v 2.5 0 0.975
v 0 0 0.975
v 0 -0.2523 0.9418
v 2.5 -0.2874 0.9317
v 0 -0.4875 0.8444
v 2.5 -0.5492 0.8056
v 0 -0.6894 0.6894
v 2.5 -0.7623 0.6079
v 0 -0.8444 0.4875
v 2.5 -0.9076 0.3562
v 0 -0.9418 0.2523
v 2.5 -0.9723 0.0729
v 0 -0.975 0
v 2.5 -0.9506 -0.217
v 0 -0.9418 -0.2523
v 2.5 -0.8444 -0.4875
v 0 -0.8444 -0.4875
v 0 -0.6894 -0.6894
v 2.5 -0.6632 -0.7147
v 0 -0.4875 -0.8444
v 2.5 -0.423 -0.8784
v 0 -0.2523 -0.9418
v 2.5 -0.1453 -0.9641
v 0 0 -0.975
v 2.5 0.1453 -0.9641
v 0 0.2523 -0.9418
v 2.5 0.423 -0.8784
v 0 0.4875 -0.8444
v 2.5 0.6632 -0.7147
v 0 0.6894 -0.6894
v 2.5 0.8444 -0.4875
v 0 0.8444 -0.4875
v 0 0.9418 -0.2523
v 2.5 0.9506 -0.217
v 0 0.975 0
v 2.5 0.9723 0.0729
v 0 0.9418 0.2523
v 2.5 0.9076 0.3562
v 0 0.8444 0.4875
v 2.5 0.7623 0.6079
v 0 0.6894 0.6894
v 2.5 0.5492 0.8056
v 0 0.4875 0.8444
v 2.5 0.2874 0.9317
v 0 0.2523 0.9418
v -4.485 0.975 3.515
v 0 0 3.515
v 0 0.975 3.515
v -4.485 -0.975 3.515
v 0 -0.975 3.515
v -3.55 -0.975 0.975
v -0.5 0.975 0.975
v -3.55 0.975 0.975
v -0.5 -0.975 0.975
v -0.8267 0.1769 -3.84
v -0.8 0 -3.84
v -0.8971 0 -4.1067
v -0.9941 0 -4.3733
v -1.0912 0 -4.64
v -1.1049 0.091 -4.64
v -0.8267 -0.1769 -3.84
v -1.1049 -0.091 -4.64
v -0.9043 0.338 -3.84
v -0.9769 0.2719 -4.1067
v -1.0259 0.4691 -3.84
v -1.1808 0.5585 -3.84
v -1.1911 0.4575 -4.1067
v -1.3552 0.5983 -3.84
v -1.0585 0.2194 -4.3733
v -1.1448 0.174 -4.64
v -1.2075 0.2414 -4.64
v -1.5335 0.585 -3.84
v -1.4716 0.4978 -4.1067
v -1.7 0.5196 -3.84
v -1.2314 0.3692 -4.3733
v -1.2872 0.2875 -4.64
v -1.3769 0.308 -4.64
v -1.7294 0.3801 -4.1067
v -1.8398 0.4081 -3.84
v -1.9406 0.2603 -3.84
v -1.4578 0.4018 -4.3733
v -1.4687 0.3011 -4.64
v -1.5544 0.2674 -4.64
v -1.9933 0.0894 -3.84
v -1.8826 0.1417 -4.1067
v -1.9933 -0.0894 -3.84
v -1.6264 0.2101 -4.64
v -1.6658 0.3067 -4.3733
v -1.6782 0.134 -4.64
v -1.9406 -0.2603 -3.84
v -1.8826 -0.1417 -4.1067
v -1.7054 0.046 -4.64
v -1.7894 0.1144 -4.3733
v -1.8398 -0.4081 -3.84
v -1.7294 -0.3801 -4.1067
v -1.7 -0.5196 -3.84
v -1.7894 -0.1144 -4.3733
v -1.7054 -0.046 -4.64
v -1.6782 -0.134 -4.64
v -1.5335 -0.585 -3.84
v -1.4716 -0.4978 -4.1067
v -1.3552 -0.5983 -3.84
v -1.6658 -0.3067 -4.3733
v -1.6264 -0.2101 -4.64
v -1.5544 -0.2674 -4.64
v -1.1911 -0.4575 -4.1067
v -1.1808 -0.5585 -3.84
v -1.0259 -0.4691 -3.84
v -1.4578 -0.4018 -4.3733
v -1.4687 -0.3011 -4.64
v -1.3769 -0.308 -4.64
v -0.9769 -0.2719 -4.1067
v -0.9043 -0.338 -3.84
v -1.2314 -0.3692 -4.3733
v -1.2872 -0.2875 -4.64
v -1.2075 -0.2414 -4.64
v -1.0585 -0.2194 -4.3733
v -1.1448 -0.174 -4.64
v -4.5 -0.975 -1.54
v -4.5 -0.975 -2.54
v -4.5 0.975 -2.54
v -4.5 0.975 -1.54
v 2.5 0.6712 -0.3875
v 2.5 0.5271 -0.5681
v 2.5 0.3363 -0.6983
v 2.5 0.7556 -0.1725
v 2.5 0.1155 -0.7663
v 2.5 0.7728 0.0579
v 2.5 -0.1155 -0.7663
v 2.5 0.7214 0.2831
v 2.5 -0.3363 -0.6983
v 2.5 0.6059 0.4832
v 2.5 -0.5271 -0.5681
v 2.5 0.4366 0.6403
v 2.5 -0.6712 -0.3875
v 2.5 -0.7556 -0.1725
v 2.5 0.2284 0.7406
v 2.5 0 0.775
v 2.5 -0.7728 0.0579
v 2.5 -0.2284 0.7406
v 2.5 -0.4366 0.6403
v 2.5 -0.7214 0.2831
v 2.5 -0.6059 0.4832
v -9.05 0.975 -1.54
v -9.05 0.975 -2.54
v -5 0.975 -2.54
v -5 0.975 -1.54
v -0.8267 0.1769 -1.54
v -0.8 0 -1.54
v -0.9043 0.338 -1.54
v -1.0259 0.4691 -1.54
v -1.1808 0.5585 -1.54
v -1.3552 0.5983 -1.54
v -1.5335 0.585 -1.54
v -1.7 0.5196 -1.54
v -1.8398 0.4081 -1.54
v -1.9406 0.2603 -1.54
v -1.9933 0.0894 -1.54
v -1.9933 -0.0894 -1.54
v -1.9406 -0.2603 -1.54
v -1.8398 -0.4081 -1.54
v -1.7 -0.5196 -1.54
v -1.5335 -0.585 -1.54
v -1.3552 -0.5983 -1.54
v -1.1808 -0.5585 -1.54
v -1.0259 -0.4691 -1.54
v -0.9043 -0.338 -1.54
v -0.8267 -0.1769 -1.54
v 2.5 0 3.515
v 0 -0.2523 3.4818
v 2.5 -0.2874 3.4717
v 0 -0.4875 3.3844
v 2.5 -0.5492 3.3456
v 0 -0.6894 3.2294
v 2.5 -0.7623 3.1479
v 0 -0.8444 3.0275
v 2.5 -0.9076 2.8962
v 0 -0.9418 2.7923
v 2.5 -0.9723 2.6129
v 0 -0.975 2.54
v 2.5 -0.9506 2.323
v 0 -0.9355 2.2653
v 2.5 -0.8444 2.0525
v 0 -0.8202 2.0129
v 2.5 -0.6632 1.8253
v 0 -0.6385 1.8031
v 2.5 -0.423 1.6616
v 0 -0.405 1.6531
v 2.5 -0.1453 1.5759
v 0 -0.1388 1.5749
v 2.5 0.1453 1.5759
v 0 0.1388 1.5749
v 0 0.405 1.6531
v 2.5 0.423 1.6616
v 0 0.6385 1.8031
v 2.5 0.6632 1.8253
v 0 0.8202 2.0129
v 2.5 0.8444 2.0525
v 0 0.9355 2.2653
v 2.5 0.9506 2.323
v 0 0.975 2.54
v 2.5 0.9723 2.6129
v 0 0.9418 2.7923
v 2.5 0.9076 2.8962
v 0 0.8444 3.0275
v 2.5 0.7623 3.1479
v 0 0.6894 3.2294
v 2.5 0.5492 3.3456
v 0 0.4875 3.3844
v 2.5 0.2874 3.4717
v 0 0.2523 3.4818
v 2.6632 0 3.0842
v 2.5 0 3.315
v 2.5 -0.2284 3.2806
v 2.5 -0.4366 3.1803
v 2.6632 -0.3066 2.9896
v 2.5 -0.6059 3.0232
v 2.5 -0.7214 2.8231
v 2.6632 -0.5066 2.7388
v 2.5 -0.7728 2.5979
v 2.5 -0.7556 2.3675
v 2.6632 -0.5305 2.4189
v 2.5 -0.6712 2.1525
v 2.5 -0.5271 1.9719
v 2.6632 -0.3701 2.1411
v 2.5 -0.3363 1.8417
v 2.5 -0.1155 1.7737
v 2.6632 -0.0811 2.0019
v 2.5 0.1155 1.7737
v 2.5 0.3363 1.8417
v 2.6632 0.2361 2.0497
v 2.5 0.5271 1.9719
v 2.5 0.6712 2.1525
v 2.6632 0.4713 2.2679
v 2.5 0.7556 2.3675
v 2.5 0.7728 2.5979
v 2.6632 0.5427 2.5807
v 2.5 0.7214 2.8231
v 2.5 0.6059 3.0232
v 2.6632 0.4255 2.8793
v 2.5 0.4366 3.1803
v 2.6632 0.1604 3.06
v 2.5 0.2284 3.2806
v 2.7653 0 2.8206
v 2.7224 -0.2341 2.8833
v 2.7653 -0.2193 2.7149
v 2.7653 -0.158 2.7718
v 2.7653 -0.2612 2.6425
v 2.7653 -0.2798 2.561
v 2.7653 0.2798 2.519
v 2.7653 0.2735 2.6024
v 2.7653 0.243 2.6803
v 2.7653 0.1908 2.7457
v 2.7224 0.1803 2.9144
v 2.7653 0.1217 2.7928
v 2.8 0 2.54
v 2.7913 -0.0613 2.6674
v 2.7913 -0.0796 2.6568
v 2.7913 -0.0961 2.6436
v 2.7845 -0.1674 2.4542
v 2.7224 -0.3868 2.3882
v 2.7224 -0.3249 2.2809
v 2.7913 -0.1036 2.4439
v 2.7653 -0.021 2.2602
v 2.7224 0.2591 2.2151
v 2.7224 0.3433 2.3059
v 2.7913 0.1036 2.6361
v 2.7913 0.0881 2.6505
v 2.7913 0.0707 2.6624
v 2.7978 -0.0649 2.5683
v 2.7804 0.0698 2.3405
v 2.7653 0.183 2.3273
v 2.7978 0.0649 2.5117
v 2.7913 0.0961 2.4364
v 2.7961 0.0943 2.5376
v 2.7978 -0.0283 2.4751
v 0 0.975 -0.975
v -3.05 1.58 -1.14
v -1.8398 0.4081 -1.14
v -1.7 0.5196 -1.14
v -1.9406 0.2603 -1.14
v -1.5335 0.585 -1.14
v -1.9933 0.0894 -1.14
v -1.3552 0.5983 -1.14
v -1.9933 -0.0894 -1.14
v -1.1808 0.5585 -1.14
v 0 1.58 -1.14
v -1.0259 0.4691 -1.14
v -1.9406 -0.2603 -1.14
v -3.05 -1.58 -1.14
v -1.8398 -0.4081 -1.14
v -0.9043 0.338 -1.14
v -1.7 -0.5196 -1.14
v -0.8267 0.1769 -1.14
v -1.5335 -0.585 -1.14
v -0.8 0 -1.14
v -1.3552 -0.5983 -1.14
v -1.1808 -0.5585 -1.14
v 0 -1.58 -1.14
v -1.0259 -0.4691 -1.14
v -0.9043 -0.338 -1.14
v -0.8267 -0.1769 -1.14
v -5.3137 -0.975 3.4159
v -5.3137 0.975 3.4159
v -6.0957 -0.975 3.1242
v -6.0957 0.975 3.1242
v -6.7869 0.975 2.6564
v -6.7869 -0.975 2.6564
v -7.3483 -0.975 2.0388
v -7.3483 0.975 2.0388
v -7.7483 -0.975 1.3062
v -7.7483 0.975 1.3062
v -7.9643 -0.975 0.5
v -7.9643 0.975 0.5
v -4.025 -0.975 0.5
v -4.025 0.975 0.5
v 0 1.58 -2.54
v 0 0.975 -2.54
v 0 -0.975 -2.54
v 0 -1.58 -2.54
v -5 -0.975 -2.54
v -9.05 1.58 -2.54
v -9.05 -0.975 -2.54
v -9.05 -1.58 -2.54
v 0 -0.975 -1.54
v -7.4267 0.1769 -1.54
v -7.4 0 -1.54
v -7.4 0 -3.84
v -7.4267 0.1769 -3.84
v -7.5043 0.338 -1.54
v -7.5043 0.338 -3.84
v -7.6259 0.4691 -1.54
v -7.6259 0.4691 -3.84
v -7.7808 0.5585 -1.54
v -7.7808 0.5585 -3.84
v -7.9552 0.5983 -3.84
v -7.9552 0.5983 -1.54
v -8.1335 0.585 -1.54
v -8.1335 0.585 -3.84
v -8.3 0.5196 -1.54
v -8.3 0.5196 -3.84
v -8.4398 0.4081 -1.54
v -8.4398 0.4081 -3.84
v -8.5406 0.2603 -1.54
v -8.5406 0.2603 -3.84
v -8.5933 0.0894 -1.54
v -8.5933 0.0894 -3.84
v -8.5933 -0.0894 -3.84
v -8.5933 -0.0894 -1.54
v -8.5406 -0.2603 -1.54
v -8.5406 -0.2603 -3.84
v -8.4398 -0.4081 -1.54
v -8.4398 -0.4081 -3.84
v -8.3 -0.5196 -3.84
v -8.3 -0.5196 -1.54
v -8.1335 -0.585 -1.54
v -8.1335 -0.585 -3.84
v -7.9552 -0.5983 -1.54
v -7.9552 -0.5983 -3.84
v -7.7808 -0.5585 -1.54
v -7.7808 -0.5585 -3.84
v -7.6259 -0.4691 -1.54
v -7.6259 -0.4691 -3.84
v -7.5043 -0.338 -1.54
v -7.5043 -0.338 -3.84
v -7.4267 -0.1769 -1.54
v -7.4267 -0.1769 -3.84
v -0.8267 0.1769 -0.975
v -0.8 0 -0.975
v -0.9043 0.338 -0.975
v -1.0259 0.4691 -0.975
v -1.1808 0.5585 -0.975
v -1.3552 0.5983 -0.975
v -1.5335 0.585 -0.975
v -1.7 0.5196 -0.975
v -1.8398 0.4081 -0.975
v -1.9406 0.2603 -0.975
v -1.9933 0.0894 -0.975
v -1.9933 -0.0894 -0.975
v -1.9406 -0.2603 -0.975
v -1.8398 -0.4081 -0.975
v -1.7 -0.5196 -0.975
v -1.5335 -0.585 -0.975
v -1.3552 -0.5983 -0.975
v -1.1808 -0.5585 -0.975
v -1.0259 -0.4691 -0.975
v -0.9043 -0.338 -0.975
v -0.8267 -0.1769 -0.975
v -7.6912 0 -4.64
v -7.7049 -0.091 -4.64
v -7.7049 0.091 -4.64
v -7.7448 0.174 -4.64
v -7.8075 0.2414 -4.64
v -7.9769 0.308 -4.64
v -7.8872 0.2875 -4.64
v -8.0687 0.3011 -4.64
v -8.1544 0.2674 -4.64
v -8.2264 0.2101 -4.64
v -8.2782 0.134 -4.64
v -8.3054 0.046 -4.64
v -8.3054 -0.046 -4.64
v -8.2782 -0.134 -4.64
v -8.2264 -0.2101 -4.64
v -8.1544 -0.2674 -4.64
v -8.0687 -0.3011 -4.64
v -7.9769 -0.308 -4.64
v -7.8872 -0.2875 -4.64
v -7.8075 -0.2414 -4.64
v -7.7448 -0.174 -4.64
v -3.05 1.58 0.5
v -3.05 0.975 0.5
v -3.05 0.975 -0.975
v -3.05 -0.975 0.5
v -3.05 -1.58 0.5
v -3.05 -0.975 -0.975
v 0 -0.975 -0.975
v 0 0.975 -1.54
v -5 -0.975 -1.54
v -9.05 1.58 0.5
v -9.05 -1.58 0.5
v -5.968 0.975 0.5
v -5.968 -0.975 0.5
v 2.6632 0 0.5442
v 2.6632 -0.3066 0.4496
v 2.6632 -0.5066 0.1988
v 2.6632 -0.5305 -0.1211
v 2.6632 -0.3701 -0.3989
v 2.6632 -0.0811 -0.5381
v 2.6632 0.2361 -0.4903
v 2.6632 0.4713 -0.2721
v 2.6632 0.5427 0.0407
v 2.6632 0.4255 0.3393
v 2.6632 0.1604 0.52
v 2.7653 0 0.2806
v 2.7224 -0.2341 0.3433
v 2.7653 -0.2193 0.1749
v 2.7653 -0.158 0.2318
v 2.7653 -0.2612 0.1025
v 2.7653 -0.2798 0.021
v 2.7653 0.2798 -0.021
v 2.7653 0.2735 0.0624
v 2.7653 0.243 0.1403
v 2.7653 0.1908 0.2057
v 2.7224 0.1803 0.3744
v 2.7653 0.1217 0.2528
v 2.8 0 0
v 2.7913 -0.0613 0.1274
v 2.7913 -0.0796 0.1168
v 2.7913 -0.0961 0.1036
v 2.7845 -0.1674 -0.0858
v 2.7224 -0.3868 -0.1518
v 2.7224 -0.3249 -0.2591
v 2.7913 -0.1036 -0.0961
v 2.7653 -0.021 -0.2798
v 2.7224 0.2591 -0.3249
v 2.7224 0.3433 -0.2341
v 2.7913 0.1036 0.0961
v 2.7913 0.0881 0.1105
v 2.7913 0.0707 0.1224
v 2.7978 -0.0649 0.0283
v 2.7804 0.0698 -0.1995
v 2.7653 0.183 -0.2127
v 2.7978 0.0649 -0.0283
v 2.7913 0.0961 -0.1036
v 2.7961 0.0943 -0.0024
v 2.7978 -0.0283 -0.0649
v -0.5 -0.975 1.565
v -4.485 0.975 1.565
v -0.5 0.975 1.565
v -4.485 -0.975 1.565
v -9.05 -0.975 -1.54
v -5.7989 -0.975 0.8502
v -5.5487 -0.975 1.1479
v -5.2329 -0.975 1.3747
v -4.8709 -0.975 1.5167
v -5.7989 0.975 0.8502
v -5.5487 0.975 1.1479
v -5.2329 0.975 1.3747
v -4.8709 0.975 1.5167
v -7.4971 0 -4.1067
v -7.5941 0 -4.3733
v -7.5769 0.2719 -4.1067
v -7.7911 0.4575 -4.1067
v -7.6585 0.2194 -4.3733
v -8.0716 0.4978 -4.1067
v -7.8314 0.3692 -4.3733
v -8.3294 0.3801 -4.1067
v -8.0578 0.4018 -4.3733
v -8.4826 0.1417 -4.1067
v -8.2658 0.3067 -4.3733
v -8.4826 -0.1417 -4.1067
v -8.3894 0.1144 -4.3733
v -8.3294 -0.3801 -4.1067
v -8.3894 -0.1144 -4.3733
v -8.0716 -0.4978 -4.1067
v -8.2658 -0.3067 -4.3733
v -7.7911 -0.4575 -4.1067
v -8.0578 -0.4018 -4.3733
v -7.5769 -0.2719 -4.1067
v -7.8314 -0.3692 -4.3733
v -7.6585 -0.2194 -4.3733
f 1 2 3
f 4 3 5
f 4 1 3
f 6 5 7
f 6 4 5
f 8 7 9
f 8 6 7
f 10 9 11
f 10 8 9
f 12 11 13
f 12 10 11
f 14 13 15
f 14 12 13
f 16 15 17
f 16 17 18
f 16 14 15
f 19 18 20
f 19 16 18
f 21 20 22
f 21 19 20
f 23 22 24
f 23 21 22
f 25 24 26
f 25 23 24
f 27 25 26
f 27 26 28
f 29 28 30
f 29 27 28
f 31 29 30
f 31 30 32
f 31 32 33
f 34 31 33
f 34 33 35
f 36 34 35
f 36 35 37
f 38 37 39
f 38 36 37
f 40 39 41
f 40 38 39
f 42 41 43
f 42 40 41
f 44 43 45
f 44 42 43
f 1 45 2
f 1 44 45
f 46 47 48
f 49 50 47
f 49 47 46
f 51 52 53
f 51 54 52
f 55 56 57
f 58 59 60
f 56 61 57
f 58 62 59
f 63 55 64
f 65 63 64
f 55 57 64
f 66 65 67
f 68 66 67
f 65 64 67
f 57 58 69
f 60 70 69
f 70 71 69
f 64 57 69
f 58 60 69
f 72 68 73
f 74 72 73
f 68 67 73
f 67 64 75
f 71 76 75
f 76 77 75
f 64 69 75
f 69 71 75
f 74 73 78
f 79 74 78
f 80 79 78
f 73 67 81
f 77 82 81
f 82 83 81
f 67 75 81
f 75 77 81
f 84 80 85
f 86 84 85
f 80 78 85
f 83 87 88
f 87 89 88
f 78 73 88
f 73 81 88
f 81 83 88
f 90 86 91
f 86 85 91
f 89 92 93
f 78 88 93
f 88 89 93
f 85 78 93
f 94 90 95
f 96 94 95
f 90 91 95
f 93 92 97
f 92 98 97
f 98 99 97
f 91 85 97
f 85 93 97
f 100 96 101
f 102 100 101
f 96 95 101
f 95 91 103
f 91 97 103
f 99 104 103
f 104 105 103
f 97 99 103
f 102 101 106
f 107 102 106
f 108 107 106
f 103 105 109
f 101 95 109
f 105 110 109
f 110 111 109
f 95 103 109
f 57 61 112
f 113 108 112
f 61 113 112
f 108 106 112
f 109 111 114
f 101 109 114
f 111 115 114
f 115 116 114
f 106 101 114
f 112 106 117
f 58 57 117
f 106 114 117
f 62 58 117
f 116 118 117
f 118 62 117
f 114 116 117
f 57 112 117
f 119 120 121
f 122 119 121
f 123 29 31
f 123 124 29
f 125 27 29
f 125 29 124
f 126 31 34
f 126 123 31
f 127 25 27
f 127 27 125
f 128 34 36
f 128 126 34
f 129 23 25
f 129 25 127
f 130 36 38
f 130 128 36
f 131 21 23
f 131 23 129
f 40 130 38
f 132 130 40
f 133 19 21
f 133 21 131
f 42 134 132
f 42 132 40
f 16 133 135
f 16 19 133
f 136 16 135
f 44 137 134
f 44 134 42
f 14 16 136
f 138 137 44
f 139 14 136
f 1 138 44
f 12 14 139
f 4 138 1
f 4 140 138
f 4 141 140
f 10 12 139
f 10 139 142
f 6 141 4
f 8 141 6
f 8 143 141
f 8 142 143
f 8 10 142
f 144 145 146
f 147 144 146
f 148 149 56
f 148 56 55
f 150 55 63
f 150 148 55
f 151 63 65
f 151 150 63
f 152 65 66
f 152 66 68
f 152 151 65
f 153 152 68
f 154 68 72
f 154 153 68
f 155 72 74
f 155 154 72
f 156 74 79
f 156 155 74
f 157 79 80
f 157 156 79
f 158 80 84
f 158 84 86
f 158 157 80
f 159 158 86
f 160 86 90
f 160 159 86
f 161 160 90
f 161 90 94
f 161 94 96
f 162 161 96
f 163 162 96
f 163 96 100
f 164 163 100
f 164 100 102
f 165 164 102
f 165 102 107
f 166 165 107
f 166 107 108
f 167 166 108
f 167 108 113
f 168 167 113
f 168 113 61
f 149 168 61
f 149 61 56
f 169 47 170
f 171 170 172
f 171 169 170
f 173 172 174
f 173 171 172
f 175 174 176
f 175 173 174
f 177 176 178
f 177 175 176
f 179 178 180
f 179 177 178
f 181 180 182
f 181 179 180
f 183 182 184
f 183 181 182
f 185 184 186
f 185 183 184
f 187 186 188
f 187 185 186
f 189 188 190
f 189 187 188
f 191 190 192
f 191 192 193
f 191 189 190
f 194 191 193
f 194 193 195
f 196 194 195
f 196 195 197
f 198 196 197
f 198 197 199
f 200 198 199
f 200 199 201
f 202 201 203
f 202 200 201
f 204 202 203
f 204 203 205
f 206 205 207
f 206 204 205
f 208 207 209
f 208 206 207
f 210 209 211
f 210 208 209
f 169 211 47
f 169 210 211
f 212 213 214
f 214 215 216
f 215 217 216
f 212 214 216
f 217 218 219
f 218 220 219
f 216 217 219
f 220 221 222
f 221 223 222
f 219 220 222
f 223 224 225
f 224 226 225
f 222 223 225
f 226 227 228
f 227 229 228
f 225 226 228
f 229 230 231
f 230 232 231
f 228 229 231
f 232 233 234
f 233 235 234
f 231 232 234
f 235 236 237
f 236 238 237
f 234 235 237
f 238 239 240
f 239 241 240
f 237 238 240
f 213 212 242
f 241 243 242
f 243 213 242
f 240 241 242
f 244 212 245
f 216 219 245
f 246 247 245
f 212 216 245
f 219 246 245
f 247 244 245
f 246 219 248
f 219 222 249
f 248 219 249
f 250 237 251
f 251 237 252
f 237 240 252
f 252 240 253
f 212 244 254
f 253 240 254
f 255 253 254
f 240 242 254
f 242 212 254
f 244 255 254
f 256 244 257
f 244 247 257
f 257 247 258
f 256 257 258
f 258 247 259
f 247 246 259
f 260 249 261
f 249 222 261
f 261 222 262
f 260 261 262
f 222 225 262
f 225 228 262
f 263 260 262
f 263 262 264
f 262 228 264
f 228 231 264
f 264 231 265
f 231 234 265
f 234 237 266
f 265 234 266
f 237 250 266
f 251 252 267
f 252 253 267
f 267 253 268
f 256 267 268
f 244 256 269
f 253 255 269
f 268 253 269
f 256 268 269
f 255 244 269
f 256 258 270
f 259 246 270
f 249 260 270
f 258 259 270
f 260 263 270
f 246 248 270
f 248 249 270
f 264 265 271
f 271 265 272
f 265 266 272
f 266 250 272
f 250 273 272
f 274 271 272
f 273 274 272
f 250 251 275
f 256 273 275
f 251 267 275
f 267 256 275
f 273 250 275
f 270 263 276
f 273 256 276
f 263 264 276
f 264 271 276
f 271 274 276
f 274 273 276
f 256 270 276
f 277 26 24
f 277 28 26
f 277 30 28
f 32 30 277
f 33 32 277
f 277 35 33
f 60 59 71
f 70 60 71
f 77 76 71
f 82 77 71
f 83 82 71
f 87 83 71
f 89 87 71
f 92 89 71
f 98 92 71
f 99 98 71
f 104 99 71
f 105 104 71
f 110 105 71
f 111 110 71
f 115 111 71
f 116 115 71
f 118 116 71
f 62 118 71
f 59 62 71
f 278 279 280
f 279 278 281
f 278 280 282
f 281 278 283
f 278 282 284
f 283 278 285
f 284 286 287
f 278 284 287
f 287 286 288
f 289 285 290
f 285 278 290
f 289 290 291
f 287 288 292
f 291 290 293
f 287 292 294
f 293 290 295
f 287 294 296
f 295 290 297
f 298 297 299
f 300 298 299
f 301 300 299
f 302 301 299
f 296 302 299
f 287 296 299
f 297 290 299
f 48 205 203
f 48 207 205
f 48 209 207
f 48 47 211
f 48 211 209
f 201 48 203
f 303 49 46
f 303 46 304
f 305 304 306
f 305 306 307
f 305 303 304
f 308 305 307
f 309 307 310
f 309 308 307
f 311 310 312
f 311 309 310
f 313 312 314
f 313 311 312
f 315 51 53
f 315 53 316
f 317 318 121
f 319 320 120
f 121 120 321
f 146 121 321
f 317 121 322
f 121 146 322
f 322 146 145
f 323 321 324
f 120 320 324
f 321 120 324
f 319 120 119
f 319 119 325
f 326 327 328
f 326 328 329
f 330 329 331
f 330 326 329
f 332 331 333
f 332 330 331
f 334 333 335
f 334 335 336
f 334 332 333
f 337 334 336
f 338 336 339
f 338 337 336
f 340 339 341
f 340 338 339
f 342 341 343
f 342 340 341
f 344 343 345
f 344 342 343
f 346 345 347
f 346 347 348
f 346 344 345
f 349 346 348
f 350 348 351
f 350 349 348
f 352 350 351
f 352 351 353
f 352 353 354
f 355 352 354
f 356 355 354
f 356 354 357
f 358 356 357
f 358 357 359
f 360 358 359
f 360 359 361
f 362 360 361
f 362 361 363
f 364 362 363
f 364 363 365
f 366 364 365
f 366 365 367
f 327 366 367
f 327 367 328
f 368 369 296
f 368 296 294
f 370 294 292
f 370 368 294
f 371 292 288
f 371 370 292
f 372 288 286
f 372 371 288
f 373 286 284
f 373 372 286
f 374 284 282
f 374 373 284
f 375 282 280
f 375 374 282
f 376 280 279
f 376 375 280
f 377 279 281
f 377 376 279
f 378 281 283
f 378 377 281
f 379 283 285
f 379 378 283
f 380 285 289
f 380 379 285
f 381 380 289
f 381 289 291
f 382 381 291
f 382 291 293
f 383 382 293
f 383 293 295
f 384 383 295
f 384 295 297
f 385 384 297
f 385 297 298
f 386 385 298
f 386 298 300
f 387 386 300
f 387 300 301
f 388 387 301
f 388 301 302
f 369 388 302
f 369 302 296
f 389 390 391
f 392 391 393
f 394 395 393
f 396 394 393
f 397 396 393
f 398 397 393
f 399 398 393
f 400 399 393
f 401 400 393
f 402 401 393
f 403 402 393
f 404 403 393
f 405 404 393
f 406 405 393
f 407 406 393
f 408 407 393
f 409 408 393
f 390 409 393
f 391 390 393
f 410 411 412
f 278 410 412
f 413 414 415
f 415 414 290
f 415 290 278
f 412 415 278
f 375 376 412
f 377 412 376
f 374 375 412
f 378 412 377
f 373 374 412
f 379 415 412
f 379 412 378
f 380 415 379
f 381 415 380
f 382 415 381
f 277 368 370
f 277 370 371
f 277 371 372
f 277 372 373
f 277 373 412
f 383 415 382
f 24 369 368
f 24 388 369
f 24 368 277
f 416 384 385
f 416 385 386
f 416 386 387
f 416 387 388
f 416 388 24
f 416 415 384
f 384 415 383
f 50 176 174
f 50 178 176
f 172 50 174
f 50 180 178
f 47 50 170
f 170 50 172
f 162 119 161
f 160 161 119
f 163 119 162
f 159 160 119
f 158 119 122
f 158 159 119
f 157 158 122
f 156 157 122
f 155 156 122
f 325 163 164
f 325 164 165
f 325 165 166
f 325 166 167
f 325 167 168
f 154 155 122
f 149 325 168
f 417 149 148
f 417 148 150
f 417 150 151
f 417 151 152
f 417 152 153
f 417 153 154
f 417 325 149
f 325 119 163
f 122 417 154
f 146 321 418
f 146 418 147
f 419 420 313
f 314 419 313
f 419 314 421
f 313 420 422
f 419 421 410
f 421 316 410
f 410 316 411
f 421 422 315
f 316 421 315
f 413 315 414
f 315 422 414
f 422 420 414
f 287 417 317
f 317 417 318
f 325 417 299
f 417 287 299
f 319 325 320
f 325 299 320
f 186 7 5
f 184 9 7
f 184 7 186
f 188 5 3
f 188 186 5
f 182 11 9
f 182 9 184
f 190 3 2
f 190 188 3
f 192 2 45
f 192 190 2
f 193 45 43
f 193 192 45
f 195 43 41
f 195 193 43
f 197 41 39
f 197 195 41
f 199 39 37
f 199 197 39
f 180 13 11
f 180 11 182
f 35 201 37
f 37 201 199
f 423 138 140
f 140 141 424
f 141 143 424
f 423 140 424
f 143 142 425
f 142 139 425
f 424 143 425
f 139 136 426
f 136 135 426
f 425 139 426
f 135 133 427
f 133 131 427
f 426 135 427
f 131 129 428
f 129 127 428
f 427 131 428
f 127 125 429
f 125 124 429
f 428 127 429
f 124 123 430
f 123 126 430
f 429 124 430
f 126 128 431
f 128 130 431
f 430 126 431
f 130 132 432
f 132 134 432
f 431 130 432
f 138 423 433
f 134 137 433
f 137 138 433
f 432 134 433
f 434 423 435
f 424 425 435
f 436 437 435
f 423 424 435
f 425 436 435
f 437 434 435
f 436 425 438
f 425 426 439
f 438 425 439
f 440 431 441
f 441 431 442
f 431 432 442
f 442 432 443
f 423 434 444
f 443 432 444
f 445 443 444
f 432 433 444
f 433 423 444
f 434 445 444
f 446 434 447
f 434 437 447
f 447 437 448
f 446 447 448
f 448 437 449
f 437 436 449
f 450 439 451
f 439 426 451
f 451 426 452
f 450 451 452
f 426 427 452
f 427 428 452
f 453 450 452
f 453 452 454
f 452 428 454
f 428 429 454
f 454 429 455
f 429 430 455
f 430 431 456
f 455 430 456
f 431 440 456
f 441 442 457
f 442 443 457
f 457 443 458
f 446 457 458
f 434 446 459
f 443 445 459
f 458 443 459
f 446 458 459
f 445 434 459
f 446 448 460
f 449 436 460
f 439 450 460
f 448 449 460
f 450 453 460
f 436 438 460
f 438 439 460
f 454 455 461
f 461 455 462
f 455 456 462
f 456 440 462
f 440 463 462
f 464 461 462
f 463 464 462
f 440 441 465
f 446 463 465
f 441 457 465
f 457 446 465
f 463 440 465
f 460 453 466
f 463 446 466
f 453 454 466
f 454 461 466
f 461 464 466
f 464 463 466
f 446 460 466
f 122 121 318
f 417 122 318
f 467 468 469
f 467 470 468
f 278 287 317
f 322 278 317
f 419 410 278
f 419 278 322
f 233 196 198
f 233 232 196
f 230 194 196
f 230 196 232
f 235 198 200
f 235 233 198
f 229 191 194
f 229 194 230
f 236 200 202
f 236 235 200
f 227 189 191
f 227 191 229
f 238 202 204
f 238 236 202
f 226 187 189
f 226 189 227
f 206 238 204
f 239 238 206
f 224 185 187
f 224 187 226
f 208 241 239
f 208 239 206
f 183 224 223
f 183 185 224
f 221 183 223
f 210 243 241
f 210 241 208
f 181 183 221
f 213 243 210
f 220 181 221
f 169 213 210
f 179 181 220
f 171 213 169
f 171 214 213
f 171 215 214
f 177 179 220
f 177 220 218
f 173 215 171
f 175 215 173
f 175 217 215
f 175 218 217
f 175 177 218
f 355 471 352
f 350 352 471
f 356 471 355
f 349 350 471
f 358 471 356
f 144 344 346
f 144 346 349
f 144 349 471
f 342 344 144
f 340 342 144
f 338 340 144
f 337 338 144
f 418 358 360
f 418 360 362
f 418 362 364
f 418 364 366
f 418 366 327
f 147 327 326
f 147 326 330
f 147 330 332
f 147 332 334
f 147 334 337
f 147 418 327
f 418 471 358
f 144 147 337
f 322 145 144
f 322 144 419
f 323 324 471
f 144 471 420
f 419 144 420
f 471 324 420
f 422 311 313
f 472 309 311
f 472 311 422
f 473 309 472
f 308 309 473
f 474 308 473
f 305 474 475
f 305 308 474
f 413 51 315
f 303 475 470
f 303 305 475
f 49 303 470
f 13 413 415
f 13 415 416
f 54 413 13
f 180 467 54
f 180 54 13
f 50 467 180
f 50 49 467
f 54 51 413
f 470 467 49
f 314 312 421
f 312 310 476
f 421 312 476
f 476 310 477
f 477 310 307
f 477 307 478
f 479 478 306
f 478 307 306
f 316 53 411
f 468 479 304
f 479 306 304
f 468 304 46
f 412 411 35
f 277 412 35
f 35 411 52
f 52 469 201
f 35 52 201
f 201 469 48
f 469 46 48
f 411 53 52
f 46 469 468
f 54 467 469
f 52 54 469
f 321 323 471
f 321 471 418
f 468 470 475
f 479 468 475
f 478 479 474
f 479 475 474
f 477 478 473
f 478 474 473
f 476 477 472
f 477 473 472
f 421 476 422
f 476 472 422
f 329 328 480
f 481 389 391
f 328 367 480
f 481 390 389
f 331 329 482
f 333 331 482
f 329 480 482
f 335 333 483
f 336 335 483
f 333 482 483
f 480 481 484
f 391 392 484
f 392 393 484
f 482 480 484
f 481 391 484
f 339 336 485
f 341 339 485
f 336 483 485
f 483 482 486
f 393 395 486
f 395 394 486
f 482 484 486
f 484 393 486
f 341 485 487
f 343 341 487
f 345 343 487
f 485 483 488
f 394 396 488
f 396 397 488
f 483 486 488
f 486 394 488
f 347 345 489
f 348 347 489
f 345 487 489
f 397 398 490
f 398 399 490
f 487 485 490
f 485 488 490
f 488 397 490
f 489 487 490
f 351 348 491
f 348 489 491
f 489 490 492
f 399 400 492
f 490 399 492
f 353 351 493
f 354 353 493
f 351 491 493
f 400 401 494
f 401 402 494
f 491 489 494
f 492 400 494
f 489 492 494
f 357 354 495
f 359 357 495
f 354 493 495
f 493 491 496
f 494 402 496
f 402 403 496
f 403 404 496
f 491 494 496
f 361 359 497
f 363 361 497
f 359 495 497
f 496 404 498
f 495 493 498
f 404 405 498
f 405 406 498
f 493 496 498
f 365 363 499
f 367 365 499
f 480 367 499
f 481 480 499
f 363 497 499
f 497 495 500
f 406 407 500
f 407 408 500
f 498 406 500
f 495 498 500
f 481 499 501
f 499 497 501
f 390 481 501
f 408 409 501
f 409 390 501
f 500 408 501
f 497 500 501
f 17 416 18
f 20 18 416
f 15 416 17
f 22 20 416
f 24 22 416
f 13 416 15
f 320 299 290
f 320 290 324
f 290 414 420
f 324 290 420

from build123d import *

# Parameters (mm, degrees)
SKETCH001_W            = 1.95
SKETCH001_H            = 4.49
PAD_DEPTH              = 0.5
LINEARPATTERN_COUNT    = 2
LINEARPATTERN_PITCH    = 2.54
PAD001_DEPTH           = 0.975
PAD002_DEPTH           = 0.975
PAD003_DEPTH           = 1.58
SKETCH005_W            = 1.95
SKETCH005_H            = 4.5
SKETCH005_H_2          = 4.05
POCKET_DEPTH           = 1
SKETCH006_R            = 0.6
PAD004_DEPTH           = 4.64
LINEARPATTERN001_COUNT = 2
LINEARPATTERN001_PITCH = 6.6
CHAMFER_1_ANGLE        = 20
CHAMFER_1_SIZE         = 0.8
CHAMFER_2_ANGLE        = 20
CHAMFER_2_SIZE         = 0.8


with BuildPart() as part:
    # Sketch001 → Pad (new body)
    with BuildSketch(Plane.YZ):
        with Locations((0, 1.27)):
            Rectangle(SKETCH001_W, SKETCH001_H)
    extrude(amount=-PAD_DEPTH)

    # Sketch → Revolution (revolve)
    with BuildSketch(Plane.XZ):
        with BuildLine():
            Line((0, 0), (0, 0.975))
            Line((0, 0.975), (2.5, 0.975))
            Line((2.5, 0.975), (2.5, 0.775))
            ThreePointArc((2.8, 0), (2.722383, 0.415519), (2.5, 0.775))
            Line((2.8, 0), (0, 0))
        make_face()
    revolution = revolve(axis=Axis((0, 0, 0), (1, 0, 0)))

    # LinearPattern: Revolution ×2
    with Locations(*[(0, 0, i * LINEARPATTERN_PITCH) for i in range(1, LINEARPATTERN_COUNT)]):
        add(revolution)

    # Sketch002 → Pad001 (join, symmetric)
    with BuildSketch(Plane.XZ):
        with BuildLine():
            Line((-0.5, 3.515), (-4.485, 3.515))
            ThreePointArc((-4.485, 3.515), (-6.97048, 2.48548), (-8, 0))
            Line((-8, 0), (-6.05, 0))
            ThreePointArc((-4.485, 1.565), (-5.591622, 1.106622), (-6.05, 0))
            Line((-4.485, 1.565), (-0.5, 1.565))
            Line((-0.5, 1.565), (-0.5, 3.515))
        make_face()
    extrude(amount=PAD001_DEPTH, both=True)

    # Sketch003 → Pad002 (join, symmetric)
    with BuildSketch(Plane.XZ):
        Polygon((-0.5, 0.975), (-3.55, 0.975), (-5.5, -0.975), (-0.5, -0.975), align=None)
    extrude(amount=PAD002_DEPTH, both=True)

    # Sketch004 → Pad003 (join, symmetric)
    with BuildSketch(Plane.XZ):
        Polygon((0, -2.54), (-9.05, -2.54), (-9.05, 0.5), (-3.05, 0.5), (-3.05, -1.14), (0, -1.14), align=None)
    extrude(amount=PAD003_DEPTH, both=True)

    # Sketch005 (on Face27 of Pad003) → Pocket (cut)
    with BuildSketch(Plane.YX.offset(2.54)):
        with Locations((0, -2.25)):
            Rectangle(SKETCH005_W, SKETCH005_H)
        with Locations((0, -7.025)):
            Rectangle(SKETCH005_W, SKETCH005_H_2)
    extrude(amount=-POCKET_DEPTH, mode=Mode.SUBTRACT)

    # Sketch006 → Pad004 (join)
    with BuildSketch(Plane.XY):
        with Locations((-1.4, 0)):
            Circle(SKETCH006_R)
    pad004 = extrude(amount=-PAD004_DEPTH)

    # LinearPattern001: Pad004 ×2
    with Locations(*[(-i * LINEARPATTERN001_PITCH, 0, 0) for i in range(1, LINEARPATTERN001_COUNT)]):
        add(pad004)

    # Chamfer 1
    chamfer_1_edges = [part.edges().sort_by_distance(p)[0] for p in [
        (-2, 0, -4.64),
    ]]
    chamfer_1_side = part.faces().sort_by_distance((-2, 0, -3.09))[0]
    chamfer(chamfer_1_edges, length=CHAMFER_1_SIZE, angle=CHAMFER_1_ANGLE, reference=chamfer_1_side)

    # Chamfer 2
    chamfer_2_edges = [part.edges().sort_by_distance(p)[0] for p in [
        (-8.6, 0, -4.64),
    ]]
    chamfer_2_side = part.faces().sort_by_distance((-8.6, 0, -3.09))[0]
    chamfer(chamfer_2_edges, length=CHAMFER_2_SIZE, angle=CHAMFER_2_ANGLE, reference=chamfer_2_side)


solid = part.part
